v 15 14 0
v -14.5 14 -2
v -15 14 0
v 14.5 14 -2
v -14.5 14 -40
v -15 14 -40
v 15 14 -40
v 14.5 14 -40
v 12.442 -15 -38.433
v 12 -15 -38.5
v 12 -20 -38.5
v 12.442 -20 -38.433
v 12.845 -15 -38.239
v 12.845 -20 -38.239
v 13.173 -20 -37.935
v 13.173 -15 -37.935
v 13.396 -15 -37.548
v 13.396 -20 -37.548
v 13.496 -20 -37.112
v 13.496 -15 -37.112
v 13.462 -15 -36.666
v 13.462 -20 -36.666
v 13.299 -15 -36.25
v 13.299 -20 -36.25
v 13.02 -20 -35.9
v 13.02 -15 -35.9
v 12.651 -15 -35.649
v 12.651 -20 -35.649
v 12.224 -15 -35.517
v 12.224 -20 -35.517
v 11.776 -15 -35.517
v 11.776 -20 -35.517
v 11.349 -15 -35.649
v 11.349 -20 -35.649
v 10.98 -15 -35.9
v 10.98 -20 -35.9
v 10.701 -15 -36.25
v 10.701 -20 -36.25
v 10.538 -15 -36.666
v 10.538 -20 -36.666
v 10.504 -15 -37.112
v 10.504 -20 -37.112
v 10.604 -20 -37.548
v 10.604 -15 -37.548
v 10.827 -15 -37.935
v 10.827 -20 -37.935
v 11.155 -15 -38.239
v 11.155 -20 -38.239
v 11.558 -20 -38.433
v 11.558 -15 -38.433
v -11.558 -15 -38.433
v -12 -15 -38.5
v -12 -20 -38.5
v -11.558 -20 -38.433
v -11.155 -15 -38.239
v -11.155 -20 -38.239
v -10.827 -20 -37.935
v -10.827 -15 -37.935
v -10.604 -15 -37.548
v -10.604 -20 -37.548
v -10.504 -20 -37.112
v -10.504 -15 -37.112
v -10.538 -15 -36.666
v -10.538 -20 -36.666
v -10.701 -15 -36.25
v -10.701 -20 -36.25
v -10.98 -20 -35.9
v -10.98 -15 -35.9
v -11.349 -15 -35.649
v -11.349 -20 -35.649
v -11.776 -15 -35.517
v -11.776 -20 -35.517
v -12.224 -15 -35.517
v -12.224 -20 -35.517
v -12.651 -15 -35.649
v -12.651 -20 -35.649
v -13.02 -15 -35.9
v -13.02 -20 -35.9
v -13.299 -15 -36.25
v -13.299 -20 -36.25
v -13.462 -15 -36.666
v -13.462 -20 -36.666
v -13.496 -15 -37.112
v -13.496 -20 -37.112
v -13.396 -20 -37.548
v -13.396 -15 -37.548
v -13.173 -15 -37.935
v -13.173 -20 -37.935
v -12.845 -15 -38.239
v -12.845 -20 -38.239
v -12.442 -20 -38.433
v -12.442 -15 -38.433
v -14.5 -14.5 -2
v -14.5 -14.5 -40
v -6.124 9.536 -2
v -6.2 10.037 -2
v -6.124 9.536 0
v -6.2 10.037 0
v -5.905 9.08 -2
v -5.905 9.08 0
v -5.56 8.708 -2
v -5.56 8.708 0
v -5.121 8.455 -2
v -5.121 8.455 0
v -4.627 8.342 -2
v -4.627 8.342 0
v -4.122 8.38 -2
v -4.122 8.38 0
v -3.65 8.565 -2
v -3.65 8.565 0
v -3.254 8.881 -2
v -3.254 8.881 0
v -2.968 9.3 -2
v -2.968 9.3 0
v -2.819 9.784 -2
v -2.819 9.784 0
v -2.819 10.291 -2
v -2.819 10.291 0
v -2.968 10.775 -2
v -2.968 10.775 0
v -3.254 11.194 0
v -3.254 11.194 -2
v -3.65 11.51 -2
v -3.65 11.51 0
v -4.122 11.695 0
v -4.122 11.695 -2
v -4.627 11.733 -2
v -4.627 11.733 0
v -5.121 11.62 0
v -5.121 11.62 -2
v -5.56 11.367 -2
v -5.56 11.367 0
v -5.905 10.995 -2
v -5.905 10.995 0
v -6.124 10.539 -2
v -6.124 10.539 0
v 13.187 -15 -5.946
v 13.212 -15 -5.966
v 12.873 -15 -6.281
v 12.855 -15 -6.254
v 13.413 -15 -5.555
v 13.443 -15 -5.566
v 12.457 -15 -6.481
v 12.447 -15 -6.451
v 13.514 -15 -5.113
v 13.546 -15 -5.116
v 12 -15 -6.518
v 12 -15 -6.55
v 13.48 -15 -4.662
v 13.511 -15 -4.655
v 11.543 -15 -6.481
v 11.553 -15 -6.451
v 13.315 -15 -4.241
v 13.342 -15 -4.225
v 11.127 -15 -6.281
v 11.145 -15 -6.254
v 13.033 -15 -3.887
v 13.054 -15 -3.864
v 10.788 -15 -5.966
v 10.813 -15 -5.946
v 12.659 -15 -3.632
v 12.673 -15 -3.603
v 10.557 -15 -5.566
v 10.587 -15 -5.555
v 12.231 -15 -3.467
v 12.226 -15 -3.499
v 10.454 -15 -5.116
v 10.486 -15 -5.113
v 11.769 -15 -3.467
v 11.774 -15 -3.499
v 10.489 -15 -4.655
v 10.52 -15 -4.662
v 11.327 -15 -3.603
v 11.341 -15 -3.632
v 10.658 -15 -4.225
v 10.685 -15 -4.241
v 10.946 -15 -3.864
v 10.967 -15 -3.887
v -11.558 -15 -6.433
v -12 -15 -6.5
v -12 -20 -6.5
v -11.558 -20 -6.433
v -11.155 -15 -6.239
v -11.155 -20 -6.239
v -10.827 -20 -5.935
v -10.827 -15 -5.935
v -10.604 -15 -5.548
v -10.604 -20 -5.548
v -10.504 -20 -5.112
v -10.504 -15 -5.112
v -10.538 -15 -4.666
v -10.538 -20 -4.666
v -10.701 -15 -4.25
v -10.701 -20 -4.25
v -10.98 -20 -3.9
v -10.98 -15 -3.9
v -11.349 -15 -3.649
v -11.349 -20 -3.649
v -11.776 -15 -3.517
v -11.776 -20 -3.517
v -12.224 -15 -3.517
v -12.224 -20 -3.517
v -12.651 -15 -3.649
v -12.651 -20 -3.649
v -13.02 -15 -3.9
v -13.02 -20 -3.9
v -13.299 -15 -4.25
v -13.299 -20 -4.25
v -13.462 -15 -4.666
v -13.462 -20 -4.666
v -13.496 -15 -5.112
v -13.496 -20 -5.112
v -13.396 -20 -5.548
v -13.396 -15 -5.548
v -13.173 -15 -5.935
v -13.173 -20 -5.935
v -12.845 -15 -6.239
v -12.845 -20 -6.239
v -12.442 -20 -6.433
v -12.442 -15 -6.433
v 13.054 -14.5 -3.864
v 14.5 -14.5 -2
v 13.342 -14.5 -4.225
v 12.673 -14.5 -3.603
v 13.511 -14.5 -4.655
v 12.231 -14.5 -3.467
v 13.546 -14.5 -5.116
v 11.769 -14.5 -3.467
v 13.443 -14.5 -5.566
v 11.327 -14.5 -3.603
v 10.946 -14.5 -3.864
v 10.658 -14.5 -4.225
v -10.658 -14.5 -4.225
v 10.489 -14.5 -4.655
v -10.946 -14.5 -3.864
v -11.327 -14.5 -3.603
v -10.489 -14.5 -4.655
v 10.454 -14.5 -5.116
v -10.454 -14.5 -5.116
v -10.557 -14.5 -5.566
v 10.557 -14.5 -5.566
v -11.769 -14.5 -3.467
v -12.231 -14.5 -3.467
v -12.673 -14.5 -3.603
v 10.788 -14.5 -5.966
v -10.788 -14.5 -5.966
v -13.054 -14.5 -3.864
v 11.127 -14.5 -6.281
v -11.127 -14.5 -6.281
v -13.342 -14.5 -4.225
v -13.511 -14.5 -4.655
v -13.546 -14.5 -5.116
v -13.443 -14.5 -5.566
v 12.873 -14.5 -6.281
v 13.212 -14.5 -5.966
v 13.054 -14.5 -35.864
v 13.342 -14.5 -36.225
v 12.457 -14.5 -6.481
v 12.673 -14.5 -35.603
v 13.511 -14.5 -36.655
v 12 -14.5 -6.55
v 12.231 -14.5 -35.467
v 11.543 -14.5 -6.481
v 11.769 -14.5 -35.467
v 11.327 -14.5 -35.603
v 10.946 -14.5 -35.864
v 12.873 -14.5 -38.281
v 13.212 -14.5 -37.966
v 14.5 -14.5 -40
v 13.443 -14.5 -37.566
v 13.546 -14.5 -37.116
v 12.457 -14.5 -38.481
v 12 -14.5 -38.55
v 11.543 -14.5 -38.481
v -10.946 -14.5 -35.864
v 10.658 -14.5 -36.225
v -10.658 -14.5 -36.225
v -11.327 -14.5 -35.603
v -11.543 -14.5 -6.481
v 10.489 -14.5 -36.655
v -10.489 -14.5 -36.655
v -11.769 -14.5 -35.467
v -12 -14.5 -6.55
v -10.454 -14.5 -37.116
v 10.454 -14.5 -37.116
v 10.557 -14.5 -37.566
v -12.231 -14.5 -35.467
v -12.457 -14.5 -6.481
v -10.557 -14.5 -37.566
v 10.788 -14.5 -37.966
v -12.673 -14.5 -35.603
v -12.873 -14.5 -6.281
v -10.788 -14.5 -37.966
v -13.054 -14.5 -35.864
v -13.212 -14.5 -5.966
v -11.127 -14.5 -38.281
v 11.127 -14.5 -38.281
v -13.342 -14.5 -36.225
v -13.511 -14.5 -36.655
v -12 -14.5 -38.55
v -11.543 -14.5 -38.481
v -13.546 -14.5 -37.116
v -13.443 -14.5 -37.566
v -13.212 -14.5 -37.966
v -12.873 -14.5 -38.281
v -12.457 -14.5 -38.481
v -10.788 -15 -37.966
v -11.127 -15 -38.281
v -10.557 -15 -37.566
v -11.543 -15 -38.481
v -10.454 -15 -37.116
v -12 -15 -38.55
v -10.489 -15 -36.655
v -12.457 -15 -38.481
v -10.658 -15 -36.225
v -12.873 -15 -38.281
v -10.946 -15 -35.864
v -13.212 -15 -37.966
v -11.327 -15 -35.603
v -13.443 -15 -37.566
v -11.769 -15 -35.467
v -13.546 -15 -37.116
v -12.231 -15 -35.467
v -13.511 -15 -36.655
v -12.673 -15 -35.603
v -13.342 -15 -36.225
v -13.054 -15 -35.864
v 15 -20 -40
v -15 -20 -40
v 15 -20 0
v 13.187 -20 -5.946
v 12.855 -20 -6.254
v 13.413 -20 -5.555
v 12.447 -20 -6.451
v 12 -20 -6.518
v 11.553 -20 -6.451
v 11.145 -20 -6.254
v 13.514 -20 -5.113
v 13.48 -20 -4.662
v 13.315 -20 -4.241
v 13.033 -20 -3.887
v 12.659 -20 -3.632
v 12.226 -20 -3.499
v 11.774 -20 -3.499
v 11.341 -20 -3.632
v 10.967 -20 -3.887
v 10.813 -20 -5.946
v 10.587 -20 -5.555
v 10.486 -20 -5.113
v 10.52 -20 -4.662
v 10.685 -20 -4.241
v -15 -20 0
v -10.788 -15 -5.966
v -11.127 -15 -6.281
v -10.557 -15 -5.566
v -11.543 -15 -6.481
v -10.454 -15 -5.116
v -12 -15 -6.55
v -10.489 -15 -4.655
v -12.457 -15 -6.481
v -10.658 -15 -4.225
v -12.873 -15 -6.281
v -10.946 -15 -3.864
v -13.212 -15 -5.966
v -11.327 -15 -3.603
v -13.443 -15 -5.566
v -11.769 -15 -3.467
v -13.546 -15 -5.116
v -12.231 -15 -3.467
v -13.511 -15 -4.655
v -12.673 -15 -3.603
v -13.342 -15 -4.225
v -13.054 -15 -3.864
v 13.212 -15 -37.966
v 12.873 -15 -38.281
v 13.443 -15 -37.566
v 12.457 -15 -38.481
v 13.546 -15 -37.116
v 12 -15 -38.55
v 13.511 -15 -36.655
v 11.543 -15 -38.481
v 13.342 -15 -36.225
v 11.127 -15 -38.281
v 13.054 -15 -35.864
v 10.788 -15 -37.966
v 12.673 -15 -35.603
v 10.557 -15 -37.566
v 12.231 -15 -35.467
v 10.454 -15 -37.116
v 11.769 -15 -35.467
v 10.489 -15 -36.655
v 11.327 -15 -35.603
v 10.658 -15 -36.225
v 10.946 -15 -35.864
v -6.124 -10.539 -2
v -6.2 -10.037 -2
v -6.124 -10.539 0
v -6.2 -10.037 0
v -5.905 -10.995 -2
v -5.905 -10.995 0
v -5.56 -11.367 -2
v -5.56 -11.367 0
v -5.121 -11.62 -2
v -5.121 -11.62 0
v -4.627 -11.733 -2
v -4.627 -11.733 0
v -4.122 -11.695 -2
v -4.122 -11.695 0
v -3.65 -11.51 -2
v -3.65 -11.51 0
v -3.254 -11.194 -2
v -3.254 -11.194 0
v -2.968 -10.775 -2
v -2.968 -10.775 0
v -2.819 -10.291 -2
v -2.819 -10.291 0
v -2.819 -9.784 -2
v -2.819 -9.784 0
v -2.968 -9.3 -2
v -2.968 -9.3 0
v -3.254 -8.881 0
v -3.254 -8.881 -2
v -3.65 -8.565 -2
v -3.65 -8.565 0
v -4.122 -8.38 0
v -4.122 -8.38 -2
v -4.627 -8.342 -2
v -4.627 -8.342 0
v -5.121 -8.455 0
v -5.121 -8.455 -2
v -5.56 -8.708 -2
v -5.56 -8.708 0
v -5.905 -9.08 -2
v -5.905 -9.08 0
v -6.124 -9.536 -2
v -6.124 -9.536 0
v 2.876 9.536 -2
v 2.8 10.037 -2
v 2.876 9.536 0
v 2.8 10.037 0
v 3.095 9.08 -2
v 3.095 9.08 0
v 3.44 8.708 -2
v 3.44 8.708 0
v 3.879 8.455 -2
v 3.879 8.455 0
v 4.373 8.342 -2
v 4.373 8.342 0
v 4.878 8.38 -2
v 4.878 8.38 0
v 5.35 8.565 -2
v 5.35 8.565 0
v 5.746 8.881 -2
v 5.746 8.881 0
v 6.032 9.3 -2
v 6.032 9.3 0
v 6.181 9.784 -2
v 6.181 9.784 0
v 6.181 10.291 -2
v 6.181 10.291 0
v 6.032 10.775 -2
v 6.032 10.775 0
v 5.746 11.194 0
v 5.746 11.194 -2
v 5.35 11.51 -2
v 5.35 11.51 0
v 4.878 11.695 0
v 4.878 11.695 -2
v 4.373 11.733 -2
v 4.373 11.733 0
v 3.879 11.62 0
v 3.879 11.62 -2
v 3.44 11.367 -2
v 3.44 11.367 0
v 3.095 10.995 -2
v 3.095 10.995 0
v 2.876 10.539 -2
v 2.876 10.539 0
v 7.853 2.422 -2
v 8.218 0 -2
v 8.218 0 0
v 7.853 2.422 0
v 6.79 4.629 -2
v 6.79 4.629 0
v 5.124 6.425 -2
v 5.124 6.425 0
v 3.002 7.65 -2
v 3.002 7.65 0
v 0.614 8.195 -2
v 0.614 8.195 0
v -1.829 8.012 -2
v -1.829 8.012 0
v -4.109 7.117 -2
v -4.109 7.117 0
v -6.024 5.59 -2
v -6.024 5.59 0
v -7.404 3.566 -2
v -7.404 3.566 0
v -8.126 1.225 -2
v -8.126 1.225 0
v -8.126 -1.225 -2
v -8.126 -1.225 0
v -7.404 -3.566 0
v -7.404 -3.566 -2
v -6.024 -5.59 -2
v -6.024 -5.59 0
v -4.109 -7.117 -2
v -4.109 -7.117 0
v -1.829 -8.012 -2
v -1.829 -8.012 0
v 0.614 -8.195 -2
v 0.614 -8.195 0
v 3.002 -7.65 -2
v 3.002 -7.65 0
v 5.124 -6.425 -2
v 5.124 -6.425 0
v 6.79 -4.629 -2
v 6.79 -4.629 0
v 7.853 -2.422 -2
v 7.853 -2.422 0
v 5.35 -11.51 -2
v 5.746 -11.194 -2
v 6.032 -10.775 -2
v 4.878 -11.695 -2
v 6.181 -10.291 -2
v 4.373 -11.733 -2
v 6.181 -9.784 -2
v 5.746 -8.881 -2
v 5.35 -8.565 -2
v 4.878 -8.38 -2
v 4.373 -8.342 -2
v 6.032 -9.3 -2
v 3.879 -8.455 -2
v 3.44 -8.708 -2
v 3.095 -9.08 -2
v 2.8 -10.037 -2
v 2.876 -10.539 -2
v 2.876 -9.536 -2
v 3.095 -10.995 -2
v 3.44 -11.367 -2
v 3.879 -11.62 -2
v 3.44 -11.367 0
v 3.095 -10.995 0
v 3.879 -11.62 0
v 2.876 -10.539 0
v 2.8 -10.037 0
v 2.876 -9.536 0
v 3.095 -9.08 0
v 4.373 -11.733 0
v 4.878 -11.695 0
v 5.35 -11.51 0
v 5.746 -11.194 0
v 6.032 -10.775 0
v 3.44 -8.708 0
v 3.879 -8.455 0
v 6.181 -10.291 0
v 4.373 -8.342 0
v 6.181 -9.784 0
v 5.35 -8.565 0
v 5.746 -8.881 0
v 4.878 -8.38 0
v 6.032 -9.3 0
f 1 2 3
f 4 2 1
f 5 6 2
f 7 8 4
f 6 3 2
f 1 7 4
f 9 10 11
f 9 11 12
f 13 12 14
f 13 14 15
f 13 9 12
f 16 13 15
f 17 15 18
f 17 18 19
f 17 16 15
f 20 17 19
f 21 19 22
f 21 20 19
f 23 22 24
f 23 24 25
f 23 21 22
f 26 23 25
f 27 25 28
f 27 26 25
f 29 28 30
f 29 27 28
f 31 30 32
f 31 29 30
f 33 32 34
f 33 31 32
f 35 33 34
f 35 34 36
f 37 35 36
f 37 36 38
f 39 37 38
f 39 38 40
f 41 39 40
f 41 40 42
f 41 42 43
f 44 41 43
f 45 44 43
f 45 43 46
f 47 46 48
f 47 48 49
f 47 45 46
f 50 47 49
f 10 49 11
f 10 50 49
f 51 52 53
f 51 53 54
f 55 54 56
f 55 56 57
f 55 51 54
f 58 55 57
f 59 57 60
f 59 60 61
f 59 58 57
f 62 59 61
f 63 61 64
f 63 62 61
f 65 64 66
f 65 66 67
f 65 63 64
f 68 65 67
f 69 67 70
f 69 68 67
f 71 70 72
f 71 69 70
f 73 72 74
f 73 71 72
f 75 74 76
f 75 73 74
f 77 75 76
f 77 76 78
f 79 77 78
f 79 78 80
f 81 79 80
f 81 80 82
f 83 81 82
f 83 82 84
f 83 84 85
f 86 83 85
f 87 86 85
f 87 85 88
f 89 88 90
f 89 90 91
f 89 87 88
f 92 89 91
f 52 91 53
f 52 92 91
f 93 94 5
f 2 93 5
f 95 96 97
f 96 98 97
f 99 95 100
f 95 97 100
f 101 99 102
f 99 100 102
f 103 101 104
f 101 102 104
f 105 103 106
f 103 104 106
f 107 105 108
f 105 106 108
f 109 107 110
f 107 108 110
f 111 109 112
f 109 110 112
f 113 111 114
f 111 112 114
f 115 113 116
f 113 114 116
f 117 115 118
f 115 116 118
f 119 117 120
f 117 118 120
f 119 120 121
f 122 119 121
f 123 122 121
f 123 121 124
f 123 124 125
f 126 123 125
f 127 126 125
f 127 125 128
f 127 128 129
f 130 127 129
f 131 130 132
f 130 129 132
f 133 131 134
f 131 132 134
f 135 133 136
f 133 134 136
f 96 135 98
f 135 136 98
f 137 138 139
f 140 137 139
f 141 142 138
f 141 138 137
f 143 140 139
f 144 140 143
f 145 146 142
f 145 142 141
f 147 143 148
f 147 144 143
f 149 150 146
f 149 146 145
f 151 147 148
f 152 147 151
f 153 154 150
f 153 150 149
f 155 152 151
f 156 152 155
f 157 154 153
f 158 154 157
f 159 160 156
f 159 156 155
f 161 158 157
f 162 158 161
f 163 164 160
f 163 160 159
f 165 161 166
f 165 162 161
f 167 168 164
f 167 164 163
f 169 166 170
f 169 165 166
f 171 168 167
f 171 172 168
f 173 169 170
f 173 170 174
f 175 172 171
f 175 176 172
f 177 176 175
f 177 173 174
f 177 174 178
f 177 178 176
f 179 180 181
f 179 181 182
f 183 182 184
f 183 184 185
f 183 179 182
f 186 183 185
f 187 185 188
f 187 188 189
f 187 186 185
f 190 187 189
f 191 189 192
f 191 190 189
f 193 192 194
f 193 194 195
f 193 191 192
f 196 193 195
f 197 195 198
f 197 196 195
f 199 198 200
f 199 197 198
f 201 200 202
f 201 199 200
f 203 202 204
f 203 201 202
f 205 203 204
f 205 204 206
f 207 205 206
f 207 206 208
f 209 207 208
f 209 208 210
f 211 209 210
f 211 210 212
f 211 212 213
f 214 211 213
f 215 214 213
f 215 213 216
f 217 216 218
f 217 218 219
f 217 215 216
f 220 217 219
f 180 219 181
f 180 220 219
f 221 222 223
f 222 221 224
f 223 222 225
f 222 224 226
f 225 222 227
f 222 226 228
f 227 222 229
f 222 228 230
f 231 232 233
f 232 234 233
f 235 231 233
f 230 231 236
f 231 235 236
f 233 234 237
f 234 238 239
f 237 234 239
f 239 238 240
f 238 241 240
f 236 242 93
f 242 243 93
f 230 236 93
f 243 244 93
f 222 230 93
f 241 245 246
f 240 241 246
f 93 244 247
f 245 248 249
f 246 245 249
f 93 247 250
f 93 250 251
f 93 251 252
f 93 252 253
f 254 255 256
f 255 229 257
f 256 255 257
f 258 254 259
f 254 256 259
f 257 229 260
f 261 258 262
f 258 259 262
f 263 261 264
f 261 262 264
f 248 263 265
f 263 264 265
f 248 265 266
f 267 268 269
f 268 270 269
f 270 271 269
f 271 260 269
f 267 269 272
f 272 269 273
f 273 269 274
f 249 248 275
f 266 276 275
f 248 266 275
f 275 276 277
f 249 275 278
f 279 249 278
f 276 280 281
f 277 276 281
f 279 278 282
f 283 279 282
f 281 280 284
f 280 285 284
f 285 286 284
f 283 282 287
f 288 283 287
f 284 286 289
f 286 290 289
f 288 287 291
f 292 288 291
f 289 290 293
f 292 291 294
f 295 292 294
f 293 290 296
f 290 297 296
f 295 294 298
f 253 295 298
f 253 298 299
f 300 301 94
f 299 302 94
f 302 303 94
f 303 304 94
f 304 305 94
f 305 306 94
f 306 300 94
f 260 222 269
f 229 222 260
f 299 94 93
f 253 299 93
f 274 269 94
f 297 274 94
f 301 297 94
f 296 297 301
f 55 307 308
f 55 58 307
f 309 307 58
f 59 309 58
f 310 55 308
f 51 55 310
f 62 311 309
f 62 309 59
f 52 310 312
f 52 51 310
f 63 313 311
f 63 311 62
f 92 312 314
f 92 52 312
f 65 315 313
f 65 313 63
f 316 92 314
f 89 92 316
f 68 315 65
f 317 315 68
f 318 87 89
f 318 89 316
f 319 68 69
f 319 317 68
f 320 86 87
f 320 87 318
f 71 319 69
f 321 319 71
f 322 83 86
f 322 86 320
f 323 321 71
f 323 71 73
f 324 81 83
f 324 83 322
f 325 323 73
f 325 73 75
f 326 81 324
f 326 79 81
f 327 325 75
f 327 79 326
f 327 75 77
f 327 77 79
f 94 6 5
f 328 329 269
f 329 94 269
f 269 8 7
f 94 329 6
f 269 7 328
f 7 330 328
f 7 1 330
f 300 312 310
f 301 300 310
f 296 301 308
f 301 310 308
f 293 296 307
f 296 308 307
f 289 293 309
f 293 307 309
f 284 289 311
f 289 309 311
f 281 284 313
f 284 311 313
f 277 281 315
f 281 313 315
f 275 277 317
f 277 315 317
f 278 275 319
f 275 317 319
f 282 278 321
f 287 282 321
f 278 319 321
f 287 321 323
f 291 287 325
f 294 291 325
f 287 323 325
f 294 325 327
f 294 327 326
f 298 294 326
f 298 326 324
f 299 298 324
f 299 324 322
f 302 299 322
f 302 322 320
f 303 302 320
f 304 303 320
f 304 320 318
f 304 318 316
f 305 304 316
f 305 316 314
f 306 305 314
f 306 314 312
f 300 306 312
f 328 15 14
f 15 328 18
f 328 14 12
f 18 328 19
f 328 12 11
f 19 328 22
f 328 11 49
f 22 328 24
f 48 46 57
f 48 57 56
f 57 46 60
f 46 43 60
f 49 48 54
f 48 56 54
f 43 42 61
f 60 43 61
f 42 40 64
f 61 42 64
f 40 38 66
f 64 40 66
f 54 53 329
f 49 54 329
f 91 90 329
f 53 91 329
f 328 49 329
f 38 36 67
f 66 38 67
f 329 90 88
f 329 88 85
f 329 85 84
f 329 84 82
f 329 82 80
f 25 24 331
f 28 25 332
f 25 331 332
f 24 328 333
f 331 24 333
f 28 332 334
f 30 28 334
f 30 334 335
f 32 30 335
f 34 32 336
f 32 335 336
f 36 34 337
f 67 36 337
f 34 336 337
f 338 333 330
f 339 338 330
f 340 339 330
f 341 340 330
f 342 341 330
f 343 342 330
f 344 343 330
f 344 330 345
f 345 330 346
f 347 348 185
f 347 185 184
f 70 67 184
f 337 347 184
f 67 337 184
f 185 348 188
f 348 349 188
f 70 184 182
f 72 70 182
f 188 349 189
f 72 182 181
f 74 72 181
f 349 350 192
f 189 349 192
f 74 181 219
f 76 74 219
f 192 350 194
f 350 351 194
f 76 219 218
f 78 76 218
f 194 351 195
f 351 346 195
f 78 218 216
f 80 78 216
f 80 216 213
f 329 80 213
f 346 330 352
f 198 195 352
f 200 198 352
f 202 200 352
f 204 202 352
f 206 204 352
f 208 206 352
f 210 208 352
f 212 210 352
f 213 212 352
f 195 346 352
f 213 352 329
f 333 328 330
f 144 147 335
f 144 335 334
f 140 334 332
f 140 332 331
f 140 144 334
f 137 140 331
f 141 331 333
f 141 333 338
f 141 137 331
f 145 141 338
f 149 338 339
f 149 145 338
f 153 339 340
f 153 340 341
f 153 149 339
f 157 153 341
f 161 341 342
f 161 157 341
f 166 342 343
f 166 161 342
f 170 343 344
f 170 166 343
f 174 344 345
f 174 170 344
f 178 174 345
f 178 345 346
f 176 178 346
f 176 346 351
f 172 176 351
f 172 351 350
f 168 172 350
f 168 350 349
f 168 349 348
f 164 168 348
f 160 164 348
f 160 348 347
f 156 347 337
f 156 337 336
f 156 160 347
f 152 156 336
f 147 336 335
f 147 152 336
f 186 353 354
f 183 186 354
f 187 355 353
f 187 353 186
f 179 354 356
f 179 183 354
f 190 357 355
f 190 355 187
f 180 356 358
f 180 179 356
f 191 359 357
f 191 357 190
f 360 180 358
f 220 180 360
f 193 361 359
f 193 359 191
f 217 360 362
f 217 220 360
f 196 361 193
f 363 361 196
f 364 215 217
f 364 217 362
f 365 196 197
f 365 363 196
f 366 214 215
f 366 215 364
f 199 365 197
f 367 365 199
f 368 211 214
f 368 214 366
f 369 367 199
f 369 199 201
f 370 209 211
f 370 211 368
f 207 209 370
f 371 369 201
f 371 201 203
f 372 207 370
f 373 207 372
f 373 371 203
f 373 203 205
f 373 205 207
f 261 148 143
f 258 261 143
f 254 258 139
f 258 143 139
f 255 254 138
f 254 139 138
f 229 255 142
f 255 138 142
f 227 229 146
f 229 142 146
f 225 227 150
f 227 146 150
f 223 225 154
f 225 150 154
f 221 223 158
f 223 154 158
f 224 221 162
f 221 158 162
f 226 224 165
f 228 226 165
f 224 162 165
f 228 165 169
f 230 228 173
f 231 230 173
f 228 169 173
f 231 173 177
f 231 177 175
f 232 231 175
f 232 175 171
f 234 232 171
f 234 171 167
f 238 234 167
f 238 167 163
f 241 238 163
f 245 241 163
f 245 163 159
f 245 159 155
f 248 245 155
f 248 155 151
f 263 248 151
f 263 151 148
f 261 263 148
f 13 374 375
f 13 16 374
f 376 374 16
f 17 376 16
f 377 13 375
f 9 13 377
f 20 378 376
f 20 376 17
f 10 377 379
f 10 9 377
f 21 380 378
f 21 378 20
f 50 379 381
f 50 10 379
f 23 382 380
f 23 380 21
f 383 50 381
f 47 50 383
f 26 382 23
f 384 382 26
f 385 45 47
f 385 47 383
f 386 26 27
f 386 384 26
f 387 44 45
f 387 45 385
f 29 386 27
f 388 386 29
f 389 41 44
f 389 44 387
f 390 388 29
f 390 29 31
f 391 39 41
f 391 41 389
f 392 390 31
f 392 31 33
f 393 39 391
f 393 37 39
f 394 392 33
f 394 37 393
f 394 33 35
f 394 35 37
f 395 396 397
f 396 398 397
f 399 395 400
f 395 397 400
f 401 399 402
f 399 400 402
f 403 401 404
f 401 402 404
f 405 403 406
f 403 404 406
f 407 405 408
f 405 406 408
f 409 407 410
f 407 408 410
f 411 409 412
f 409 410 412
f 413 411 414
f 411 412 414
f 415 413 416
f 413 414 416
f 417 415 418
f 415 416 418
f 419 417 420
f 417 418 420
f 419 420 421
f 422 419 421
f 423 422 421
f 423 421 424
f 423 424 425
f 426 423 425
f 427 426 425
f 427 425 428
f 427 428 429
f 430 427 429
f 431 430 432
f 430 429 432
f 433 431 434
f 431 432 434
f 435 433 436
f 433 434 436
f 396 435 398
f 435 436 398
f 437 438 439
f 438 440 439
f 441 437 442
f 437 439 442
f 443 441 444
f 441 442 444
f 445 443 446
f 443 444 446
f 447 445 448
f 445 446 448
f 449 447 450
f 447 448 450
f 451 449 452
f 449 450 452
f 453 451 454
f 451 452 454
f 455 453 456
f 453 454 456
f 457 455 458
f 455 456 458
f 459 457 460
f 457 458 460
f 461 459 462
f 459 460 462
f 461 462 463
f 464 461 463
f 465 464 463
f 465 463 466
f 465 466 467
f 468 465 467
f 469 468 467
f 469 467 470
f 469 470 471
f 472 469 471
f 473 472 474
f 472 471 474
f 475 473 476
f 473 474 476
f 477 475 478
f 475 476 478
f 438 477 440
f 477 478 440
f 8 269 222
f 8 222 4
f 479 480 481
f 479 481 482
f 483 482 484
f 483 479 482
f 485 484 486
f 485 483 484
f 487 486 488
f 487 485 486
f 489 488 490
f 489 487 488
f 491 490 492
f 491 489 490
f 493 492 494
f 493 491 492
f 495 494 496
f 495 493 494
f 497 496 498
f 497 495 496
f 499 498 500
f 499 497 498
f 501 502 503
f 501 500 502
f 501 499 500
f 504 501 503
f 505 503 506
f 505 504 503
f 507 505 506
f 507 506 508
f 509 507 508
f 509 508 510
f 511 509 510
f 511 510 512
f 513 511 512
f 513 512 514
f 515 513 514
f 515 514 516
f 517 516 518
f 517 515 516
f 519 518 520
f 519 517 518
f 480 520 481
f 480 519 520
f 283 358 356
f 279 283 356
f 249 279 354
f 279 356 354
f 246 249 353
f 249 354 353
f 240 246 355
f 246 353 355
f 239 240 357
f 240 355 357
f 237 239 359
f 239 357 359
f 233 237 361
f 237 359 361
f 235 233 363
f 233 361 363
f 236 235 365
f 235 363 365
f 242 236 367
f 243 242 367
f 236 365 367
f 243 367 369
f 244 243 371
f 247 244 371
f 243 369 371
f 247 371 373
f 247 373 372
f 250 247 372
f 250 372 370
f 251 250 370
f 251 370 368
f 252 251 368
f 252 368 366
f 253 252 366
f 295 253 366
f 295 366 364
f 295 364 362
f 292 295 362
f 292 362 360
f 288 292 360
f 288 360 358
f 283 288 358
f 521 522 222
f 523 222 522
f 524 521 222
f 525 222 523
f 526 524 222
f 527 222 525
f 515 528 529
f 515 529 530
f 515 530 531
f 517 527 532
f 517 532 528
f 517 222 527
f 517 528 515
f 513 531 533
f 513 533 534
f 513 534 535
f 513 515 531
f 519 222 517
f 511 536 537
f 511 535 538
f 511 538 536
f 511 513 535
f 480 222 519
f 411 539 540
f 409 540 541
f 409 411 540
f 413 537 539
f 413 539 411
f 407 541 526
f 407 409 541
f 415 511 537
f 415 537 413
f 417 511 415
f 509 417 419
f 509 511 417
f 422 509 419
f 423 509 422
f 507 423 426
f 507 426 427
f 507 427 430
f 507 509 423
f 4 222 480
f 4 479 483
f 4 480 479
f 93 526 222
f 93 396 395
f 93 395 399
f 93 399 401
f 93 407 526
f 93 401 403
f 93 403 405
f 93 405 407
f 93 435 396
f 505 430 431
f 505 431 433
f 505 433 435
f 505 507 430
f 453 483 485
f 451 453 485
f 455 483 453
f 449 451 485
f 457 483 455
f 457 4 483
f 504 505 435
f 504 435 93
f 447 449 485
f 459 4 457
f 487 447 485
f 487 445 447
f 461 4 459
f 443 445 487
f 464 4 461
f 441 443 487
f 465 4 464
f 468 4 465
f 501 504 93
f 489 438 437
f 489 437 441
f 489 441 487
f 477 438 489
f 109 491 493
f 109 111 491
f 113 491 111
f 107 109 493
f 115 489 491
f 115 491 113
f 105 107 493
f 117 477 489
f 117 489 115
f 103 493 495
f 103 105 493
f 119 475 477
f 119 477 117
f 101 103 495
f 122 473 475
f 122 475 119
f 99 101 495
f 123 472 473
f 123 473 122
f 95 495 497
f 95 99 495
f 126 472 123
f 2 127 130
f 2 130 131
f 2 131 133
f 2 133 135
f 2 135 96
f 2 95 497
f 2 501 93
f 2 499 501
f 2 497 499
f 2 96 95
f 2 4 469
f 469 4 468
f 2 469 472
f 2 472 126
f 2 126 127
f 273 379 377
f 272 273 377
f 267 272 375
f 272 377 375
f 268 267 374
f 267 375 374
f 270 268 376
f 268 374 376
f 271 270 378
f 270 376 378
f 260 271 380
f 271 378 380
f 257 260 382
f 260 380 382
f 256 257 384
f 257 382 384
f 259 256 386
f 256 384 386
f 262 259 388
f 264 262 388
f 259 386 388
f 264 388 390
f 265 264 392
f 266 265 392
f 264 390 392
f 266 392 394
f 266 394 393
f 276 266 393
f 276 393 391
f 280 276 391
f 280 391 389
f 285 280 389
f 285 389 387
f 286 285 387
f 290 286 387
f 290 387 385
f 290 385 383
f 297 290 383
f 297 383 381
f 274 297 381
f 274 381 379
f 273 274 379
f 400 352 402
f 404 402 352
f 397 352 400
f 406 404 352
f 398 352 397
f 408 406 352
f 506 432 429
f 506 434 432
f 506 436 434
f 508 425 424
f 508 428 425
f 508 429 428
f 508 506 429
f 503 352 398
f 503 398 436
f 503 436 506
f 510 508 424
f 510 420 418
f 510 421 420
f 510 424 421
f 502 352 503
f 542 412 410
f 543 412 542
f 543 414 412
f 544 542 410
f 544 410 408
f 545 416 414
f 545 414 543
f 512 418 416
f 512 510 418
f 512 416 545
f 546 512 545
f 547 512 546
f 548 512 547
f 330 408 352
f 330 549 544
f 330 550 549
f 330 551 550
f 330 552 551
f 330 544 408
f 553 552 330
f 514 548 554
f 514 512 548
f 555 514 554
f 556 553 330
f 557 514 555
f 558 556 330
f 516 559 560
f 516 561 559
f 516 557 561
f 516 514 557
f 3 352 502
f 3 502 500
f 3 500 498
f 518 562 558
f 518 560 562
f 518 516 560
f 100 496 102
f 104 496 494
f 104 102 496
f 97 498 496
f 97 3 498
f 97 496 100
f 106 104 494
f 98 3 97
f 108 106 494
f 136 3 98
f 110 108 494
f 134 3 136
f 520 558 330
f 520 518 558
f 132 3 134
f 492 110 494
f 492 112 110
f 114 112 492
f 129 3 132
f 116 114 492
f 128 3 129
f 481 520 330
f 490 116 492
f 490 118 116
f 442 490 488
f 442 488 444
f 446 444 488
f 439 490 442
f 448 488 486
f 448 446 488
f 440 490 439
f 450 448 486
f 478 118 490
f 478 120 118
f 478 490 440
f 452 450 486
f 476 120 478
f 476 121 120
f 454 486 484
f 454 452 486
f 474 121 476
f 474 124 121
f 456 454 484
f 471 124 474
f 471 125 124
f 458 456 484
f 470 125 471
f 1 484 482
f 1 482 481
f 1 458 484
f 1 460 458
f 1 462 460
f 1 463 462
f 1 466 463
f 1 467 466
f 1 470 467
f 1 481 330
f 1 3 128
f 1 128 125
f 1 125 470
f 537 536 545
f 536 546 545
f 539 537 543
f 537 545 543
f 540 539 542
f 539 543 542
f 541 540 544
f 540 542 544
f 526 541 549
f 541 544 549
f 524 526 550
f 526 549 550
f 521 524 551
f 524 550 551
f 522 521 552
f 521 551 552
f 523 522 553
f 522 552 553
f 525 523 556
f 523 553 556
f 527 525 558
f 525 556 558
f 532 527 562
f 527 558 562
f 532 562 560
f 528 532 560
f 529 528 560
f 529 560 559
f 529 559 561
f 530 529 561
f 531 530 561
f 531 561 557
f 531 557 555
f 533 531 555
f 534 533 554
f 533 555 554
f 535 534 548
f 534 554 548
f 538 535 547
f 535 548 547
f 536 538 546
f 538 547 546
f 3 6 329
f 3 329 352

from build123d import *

# Parameters (mm, degrees)
SKETCH1_W                                            = 30
SKETCH1_H                                            = 30
BOSS_EXTRUDE1_DEPTH                                  = 40
SKETCH7_W                                            = 29
SKETCH7_H                                            = 29
CUT_EXTRUDE5_DEPTH                                   = 38
CSK_FOR_M3_CROSS_COUNTERSUNK_HEAD_SCREW1_D           = 3.4
CSK_FOR_M3_CROSS_COUNTERSUNK_HEAD_SCREW1_CSINK_D     = 6
CSK_FOR_M3_CROSS_COUNTERSUNK_HEAD_SCREW1_CSINK_ANGLE = 92
SKETCH18_W                                           = 30
SKETCH18_H                                           = 40
CUT_EXTRUDE6_DEPTH                                   = 1
SKETCH19_R                                           = 1.55
CUT_EXTRUDE7_DEPTH                                   = 1
CUT_EXTRUDE8_DEPTH                                   = 46.276925691
CUT_EXTRUDE8_DEPTH_BACK                              = 46.276925691
SKETCH20_R                                           = 8.2177971
SKETCH22_R                                           = 1.5
SKETCH22_R_2                                         = 1.517998986
BOSS_EXTRUDE2_DEPTH                                  = 5


with BuildPart() as part:
    # Sketch1 → Boss-Extrude1 (new body)
    with BuildSketch(Plane.XY):
        Rectangle(SKETCH1_W, SKETCH1_H)
    extrude(amount=-BOSS_EXTRUDE1_DEPTH)

    # Sketch7 → Cut-Extrude5 (cut)
    with BuildSketch(Plane(origin=(0, 0, -40), x_dir=(-1, 0, 0), z_dir=(0, 0, -1))):
        Rectangle(SKETCH7_W, SKETCH7_H)
    extrude(amount=-CUT_EXTRUDE5_DEPTH, mode=Mode.SUBTRACT)

    # CSK for M3 Cross Countersunk Head Screw1 (through all)
    with Locations(Plane(origin=(0, 0, -40), x_dir=(1, 0, 0), z_dir=(0, 0, -1))):
        with Locations((-4.5, -10.03742995), (4.5, -10.03742995), (4.5, 10.03742995), (-4.5, 10.03742995)):
            CounterSinkHole(CSK_FOR_M3_CROSS_COUNTERSUNK_HEAD_SCREW1_D / 2, CSK_FOR_M3_CROSS_COUNTERSUNK_HEAD_SCREW1_CSINK_D / 2, counter_sink_angle=CSK_FOR_M3_CROSS_COUNTERSUNK_HEAD_SCREW1_CSINK_ANGLE)

    # Sketch18 → Cut-Extrude6 (cut)
    with BuildSketch(Plane(origin=(0, 15, 0), x_dir=(1, 0, 0), z_dir=(0, 1, 0))):
        with Locations((0, 20)):
            Rectangle(SKETCH18_W, SKETCH18_H)
    extrude(amount=-CUT_EXTRUDE6_DEPTH, mode=Mode.SUBTRACT)

    # Sketch19 → Cut-Extrude7 (cut)
    with BuildSketch(Plane.XZ.offset(15)):
        with Locations(Location((-12, -5, 0), (0, 0, 270))):
            Circle(SKETCH19_R)
        with Locations(Location((-12, -37, 0), (0, 0, 270))):
            Circle(SKETCH19_R)
        with Locations(Location((12, -37, 0), (0, 0, 270))):
            Circle(SKETCH19_R)
        with Locations(Location((12, -5, 0), (0, 0, 270))):
            Circle(SKETCH19_R)
    extrude(amount=-CUT_EXTRUDE7_DEPTH, mode=Mode.SUBTRACT)

    # Sketch20 → Cut-Extrude8 (cut, two sides: drawn at the far end of the back side and taken through both)
    with BuildSketch(Plane.XY.offset(-CUT_EXTRUDE8_DEPTH_BACK)):
        Circle(SKETCH20_R)
    extrude(amount=CUT_EXTRUDE8_DEPTH + CUT_EXTRUDE8_DEPTH_BACK, mode=Mode.SUBTRACT)

    # Sketch22 → Boss-Extrude2 (add)
    with BuildSketch(Plane.XZ.offset(15)):
        Polygon((15, -40), (14.5, -40), (-14.5, -40), (-15, -40), (-15, 0), (15, 0), align=None)
        with Locations(Location((-12, -5, 0), (0, 0, 270))):
            Circle(SKETCH22_R, mode=Mode.SUBTRACT)
        with Locations(Location((12, -5, 0), (0, 0, 270))):
            Circle(SKETCH22_R_2, mode=Mode.SUBTRACT)
        with Locations(Location((-12, -37, 0), (0, 0, 270))):
            Circle(SKETCH22_R, mode=Mode.SUBTRACT)
        with Locations(Location((12, -37, 0), (0, 0, 270))):
            Circle(SKETCH22_R, mode=Mode.SUBTRACT)
    extrude(amount=BOSS_EXTRUDE2_DEPTH)


solid = part.part
